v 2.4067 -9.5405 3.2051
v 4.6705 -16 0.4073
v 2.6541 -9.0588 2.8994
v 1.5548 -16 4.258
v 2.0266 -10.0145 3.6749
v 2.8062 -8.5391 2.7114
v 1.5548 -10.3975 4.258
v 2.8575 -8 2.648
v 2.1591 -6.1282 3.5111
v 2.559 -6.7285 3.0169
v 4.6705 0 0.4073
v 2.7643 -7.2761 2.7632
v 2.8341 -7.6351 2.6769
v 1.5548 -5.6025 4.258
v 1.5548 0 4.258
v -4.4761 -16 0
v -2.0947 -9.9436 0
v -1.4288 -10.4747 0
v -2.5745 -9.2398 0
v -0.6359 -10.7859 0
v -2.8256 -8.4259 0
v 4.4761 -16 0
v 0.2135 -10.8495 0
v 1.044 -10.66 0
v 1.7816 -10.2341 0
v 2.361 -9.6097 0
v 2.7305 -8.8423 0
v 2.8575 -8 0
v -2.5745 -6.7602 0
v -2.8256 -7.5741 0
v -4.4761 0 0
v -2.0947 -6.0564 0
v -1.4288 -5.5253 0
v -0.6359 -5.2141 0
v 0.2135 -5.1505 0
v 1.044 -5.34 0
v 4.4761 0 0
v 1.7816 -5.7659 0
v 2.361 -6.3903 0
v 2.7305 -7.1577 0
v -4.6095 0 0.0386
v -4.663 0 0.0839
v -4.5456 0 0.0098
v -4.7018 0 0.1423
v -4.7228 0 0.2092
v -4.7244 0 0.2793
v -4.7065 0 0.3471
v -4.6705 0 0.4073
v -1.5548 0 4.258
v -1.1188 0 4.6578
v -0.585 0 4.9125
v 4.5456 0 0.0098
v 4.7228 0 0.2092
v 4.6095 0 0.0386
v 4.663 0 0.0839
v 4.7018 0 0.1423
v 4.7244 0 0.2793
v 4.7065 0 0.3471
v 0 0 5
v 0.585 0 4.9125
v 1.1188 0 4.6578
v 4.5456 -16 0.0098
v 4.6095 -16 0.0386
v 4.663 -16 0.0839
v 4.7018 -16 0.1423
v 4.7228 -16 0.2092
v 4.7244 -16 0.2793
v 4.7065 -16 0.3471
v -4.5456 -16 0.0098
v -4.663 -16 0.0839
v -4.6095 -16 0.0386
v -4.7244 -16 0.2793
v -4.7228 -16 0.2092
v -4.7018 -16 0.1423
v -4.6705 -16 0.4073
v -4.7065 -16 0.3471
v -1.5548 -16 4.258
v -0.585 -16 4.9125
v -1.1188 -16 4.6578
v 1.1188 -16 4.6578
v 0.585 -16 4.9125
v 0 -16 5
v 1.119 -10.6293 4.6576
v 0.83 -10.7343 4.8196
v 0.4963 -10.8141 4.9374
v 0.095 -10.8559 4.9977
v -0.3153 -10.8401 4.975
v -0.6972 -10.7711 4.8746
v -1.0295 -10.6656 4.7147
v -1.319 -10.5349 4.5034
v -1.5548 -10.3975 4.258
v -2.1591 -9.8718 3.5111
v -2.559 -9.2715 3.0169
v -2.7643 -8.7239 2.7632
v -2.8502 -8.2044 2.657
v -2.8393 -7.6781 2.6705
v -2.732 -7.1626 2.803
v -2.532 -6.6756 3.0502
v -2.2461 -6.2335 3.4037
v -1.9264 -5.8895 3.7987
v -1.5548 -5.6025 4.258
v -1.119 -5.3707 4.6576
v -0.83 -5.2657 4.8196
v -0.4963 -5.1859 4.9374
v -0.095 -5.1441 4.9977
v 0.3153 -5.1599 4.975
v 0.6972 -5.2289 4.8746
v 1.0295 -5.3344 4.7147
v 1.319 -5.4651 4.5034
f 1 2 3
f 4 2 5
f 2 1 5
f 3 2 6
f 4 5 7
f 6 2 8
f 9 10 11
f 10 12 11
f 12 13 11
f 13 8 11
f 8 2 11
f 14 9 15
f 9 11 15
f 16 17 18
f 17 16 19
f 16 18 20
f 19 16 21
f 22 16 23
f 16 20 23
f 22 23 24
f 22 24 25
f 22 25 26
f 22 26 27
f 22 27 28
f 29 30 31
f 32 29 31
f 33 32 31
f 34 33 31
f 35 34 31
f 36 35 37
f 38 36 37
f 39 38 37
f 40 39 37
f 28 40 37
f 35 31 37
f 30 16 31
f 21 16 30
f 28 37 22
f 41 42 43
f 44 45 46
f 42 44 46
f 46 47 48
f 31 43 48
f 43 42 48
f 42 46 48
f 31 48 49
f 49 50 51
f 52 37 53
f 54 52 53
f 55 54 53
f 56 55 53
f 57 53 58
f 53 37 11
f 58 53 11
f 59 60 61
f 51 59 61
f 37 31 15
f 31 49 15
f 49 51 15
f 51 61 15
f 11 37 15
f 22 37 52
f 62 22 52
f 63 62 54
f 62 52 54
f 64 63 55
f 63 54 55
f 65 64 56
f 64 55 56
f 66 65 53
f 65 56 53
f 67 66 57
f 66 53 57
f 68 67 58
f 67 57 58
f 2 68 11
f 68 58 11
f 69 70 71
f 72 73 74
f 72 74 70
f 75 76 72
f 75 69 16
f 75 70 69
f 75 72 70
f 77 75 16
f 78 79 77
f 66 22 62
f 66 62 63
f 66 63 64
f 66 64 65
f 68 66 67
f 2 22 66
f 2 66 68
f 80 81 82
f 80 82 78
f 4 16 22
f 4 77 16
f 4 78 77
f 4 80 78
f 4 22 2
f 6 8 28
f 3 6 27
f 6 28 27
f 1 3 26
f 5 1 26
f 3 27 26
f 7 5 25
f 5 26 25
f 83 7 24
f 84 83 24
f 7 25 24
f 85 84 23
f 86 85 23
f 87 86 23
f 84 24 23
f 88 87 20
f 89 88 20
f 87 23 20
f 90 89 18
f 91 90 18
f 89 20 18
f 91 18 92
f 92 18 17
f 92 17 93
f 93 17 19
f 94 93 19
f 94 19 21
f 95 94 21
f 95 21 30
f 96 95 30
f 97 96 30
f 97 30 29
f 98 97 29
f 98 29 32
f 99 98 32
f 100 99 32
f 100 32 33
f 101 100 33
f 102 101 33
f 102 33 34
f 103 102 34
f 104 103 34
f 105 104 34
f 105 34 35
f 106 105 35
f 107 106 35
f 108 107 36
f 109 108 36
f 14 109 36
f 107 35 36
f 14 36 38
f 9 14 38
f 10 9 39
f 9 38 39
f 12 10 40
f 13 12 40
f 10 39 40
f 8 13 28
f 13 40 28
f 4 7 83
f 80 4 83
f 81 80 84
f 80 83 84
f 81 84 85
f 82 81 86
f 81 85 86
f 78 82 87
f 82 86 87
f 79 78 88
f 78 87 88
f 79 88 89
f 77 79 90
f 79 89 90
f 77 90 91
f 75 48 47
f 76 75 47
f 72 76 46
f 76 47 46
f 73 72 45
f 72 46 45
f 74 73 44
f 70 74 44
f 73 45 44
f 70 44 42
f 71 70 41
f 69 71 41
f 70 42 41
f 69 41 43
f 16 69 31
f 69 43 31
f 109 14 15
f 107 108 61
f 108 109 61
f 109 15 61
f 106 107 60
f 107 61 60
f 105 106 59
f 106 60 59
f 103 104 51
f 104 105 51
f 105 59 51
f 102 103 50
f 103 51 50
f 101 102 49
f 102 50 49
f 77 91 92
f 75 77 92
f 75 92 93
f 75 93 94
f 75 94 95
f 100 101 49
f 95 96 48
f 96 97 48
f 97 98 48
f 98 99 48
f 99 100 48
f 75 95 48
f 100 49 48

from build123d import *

# Parameters (mm, degrees)
F1_DEPTH = 16
F2_R     = 2.8575
F3_DEPTH = 5.001


with BuildPart() as f1:
    # F0 (on Front) → F1 (new body)
    with BuildSketch(Plane.XZ):
        with BuildLine():
            ThreePointArc((-4.670489, 0.407251), (-4.701763, 0.142326), (-4.476139, 0))
            Line((-4.476139, 0), (4.476139, 0))
            ThreePointArc((4.476139, 0), (4.701763, 0.142326), (4.670489, 0.407251))
            Line((4.670489, 0.407251), (1.554805, 4.258008))
            ThreePointArc((1.554805, 4.258008), (0, 5), (-1.554805, 4.258008))
            Line((-1.554805, 4.258008), (-4.670489, 0.407251))
        make_face()
    extrude(amount=F1_DEPTH)

    # F2 (on face) → F3 (cut, through all)
    with BuildSketch(Plane(origin=(0, 0, 0), x_dir=(1, 0, 0), z_dir=(0, 0, -1))):
        with Locations((0, 8)):
            Circle(F2_R)
    extrude(amount=-F3_DEPTH, mode=Mode.SUBTRACT)


solid = f1.part
